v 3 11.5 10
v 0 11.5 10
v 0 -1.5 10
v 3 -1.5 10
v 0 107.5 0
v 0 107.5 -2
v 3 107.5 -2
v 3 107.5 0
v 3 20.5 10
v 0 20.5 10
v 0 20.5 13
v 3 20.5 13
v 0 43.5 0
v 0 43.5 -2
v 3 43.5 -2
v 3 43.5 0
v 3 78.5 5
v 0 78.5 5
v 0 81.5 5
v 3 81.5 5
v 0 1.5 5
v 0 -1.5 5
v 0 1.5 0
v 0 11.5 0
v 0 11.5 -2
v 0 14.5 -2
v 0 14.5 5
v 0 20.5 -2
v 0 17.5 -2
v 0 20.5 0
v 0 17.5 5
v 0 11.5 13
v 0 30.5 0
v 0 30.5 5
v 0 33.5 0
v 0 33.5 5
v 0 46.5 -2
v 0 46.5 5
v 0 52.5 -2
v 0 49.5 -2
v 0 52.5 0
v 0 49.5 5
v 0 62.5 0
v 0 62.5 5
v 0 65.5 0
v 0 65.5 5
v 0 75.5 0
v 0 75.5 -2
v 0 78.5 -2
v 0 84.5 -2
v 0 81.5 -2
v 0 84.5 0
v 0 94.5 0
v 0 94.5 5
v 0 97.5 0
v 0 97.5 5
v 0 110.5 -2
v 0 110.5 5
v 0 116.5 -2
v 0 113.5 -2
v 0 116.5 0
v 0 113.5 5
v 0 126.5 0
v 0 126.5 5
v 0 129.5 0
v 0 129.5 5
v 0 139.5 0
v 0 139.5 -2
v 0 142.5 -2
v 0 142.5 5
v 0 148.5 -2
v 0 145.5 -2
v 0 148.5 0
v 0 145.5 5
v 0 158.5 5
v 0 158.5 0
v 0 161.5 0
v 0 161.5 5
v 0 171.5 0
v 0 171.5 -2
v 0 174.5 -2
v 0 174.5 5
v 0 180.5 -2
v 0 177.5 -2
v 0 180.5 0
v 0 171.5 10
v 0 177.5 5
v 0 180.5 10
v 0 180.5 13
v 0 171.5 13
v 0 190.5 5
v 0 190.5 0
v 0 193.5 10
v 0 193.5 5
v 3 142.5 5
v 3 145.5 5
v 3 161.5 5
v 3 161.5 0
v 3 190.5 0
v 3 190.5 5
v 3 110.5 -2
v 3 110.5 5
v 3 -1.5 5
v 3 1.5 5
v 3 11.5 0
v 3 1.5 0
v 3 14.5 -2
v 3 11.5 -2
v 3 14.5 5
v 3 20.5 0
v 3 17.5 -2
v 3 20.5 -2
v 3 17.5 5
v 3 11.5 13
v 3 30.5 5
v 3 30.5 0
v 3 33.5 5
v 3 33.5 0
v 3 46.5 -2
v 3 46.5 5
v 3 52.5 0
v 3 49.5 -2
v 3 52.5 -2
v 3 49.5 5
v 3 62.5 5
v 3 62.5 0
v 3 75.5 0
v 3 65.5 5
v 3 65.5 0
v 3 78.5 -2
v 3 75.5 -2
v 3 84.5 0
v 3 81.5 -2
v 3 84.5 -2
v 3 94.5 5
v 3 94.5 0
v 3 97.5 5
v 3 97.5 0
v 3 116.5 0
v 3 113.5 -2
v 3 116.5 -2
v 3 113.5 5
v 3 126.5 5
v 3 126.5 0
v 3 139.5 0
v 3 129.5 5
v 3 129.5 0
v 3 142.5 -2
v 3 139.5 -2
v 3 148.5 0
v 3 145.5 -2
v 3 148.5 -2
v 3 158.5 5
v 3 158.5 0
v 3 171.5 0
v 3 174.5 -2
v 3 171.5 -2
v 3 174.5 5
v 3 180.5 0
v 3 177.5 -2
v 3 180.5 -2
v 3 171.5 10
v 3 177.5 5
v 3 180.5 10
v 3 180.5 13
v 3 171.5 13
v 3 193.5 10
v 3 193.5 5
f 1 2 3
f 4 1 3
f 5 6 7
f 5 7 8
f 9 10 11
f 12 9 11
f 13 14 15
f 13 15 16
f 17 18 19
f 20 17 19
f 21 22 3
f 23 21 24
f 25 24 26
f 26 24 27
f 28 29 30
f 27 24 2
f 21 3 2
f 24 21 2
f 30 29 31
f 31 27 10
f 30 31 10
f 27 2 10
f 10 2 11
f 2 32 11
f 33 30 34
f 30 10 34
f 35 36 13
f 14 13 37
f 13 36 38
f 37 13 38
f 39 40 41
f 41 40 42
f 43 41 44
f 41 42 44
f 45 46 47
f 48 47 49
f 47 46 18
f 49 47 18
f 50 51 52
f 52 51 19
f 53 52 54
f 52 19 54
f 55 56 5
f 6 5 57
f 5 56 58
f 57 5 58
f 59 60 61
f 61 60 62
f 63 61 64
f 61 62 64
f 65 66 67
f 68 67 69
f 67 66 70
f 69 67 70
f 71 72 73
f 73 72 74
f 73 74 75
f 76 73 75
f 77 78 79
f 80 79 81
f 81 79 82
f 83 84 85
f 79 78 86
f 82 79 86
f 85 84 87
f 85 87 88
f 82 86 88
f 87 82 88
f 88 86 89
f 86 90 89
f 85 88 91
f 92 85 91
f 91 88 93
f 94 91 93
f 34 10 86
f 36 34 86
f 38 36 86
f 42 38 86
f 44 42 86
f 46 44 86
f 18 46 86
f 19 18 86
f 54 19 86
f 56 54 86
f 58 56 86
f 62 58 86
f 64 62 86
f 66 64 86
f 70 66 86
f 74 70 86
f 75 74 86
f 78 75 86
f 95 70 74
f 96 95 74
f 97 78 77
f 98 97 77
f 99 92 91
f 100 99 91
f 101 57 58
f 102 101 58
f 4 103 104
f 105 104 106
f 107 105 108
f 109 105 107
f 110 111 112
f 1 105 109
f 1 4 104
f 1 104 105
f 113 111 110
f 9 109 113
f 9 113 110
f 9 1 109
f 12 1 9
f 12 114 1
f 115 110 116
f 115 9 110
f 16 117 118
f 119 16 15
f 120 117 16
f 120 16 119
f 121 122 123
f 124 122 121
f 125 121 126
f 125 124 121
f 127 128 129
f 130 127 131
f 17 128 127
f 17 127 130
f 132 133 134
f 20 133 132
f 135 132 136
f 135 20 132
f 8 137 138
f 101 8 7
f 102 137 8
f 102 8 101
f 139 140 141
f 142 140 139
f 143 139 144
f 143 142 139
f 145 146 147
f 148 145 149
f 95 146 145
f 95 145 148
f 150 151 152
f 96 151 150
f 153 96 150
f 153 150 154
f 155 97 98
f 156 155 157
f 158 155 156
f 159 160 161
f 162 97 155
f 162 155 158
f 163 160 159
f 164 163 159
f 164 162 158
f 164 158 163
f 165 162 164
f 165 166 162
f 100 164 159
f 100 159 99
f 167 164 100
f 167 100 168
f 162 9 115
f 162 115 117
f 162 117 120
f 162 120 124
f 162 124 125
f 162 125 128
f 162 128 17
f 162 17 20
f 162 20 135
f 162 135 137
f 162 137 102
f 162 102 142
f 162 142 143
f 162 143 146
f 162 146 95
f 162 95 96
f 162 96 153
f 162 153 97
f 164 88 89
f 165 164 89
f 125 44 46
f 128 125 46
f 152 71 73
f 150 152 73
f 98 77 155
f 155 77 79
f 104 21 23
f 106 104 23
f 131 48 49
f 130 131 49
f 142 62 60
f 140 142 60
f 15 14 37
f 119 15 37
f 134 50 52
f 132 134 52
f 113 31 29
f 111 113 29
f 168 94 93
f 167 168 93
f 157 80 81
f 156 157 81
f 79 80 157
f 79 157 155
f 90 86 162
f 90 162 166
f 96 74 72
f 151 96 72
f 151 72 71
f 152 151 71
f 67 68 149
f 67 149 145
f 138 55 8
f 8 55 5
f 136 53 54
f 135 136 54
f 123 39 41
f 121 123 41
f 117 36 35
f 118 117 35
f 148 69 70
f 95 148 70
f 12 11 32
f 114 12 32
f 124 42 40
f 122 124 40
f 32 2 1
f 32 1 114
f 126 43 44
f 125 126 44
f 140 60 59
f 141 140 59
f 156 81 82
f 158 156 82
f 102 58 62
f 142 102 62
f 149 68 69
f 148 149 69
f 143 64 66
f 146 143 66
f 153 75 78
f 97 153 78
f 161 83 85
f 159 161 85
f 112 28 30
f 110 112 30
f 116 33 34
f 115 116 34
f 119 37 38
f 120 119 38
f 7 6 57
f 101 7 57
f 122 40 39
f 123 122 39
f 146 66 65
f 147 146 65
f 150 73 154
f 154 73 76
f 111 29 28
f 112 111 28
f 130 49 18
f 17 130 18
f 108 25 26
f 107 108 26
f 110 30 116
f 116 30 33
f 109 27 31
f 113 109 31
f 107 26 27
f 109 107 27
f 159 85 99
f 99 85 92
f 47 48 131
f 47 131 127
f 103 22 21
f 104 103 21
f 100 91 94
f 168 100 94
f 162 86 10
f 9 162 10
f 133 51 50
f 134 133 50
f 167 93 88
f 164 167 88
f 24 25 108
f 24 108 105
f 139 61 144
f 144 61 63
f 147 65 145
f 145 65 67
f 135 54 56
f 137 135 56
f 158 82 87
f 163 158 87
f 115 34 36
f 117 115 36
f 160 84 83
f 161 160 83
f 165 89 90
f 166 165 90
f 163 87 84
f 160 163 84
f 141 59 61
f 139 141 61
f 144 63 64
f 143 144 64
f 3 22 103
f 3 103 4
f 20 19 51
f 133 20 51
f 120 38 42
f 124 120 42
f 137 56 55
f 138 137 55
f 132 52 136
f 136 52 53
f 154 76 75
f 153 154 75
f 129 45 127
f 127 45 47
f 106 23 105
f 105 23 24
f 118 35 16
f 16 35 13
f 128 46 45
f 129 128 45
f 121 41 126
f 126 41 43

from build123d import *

# Parameters (mm, degrees)
F0_W     = 1.5
F0_H     = 5
F0_W_2   = 3
F0_H_2   = 2
F0_H_3   = 3
F1_DEPTH = 3


# Not quite as in the source:
# - a feature names something its author has since deleted; it is built from what else it names


with BuildPart() as f1:
    # F0 (on Right) → F1 (new body)
    with BuildSketch(Plane.YZ):
        Polygon((1.5, 5), (1.5, 0), (11.5, 0), (14.5, 0), (14.5, 5), (14.5, 10), (11.5, 10), (1.5, 10), align=None)
        with Locations((-0.75, 7.5)):
            Rectangle(F0_W, F0_H)
        with Locations((0.75, 7.5)):
            Rectangle(F0_W, F0_H)
        with Locations((13, -1)):
            Rectangle(F0_W_2, F0_H_2)
        with Locations((16, 7.5)):
            Rectangle(F0_W_2, F0_H)
        with Locations((19, -1)):
            Rectangle(F0_W_2, F0_H_2)
        Polygon((17.5, 5), (17.5, 0), (20.5, 0), (30.5, 0), (30.5, 5), (30.5, 10), (20.5, 10), (17.5, 10), align=None)
        with Locations((13, 11.5)):
            Rectangle(F0_W_2, F0_H_3)
        with Locations((16, 11.5)):
            Rectangle(F0_W_2, F0_H_3)
        with Locations((19, 11.5)):
            Rectangle(F0_W_2, F0_H_3)
        Polygon((33.5, 5), (33.5, 0), (43.5, 0), (46.5, 0), (46.5, 5), (46.5, 10), (33.5, 10), align=None)
        with Locations((32, 7.5)):
            Rectangle(F0_W_2, F0_H)
        with Locations((45, -1)):
            Rectangle(F0_W_2, F0_H_2)
        with Locations((48, 7.5)):
            Rectangle(F0_W_2, F0_H)
        with Locations((51, -1)):
            Rectangle(F0_W_2, F0_H_2)
        Polygon((49.5, 5), (49.5, 0), (52.5, 0), (62.5, 0), (62.5, 5), (62.5, 10), (49.5, 10), align=None)
        with Locations((64, 7.5)):
            Rectangle(F0_W_2, F0_H)
        Polygon((78.5, 10), (65.5, 10), (65.5, 5), (65.5, 0), (75.5, 0), (78.5, 0), (78.5, 5), align=None)
        with Locations((80, 7.5)):
            Rectangle(F0_W_2, F0_H)
        with Locations((77, -1)):
            Rectangle(F0_W_2, F0_H_2)
        Polygon((94.5, 10), (81.5, 10), (81.5, 5), (81.5, 0), (84.5, 0), (94.5, 0), (94.5, 5), align=None)
        with Locations((95.25, 7.5)):
            Rectangle(F0_W, F0_H)
        with Locations((83, -1)):
            Rectangle(F0_W_2, F0_H_2)
        with Locations((96.75, 7.5)):
            Rectangle(F0_W, F0_H)
        Polygon((110.5, 10), (97.5, 10), (97.5, 5), (97.5, 0), (107.5, 0), (110.5, 0), (110.5, 5), align=None)
        with Locations((112, 7.5)):
            Rectangle(F0_W_2, F0_H)
        Polygon((126.5, 10), (113.5, 10), (113.5, 5), (113.5, 0), (116.5, 0), (126.5, 0), (126.5, 5), align=None)
        with Locations((109, -1)):
            Rectangle(F0_W_2, F0_H_2)
        with Locations((128, 7.5)):
            Rectangle(F0_W_2, F0_H)
        with Locations((115, -1)):
            Rectangle(F0_W_2, F0_H_2)
        Polygon((142.5, 10), (129.5, 10), (129.5, 5), (129.5, 0), (139.5, 0), (142.5, 0), (142.5, 5), align=None)
        with Locations((144, 7.5)):
            Rectangle(F0_W_2, F0_H)
        Polygon((158.5, 10), (145.5, 10), (145.5, 5), (145.5, 0), (148.5, 0), (158.5, 0), (158.5, 5), align=None)
        with Locations((160, 7.5)):
            Rectangle(F0_W_2, F0_H)
        with Locations((141, -1)):
            Rectangle(F0_W_2, F0_H_2)
        with Locations((147, -1)):
            Rectangle(F0_W_2, F0_H_2)
        Polygon((171.5, 10), (161.5, 10), (161.5, 5), (161.5, 0), (171.5, 0), (174.5, 0), (174.5, 5), (174.5, 10), align=None)
        with Locations((173, 11.5)):
            Rectangle(F0_W_2, F0_H_3)
        with Locations((176, 11.5)):
            Rectangle(F0_W_2, F0_H_3)
        with Locations((176, 7.5)):
            Rectangle(F0_W_2, F0_H)
        with Locations((173, -1)):
            Rectangle(F0_W_2, F0_H_2)
        Polygon((180.5, 10), (177.5, 10), (177.5, 5), (177.5, 0), (180.5, 0), (190.5, 0), (190.5, 5), (190.5, 10), align=None)
        with Locations((179, 11.5)):
            Rectangle(F0_W_2, F0_H_3)
        with Locations((179, -1)):
            Rectangle(F0_W_2, F0_H_2)
        with Locations((191.25, 7.5)):
            Rectangle(F0_W, F0_H)
        with Locations((192.75, 7.5)):
            Rectangle(F0_W, F0_H)
    extrude(amount=F1_DEPTH)


solid = f1.part
